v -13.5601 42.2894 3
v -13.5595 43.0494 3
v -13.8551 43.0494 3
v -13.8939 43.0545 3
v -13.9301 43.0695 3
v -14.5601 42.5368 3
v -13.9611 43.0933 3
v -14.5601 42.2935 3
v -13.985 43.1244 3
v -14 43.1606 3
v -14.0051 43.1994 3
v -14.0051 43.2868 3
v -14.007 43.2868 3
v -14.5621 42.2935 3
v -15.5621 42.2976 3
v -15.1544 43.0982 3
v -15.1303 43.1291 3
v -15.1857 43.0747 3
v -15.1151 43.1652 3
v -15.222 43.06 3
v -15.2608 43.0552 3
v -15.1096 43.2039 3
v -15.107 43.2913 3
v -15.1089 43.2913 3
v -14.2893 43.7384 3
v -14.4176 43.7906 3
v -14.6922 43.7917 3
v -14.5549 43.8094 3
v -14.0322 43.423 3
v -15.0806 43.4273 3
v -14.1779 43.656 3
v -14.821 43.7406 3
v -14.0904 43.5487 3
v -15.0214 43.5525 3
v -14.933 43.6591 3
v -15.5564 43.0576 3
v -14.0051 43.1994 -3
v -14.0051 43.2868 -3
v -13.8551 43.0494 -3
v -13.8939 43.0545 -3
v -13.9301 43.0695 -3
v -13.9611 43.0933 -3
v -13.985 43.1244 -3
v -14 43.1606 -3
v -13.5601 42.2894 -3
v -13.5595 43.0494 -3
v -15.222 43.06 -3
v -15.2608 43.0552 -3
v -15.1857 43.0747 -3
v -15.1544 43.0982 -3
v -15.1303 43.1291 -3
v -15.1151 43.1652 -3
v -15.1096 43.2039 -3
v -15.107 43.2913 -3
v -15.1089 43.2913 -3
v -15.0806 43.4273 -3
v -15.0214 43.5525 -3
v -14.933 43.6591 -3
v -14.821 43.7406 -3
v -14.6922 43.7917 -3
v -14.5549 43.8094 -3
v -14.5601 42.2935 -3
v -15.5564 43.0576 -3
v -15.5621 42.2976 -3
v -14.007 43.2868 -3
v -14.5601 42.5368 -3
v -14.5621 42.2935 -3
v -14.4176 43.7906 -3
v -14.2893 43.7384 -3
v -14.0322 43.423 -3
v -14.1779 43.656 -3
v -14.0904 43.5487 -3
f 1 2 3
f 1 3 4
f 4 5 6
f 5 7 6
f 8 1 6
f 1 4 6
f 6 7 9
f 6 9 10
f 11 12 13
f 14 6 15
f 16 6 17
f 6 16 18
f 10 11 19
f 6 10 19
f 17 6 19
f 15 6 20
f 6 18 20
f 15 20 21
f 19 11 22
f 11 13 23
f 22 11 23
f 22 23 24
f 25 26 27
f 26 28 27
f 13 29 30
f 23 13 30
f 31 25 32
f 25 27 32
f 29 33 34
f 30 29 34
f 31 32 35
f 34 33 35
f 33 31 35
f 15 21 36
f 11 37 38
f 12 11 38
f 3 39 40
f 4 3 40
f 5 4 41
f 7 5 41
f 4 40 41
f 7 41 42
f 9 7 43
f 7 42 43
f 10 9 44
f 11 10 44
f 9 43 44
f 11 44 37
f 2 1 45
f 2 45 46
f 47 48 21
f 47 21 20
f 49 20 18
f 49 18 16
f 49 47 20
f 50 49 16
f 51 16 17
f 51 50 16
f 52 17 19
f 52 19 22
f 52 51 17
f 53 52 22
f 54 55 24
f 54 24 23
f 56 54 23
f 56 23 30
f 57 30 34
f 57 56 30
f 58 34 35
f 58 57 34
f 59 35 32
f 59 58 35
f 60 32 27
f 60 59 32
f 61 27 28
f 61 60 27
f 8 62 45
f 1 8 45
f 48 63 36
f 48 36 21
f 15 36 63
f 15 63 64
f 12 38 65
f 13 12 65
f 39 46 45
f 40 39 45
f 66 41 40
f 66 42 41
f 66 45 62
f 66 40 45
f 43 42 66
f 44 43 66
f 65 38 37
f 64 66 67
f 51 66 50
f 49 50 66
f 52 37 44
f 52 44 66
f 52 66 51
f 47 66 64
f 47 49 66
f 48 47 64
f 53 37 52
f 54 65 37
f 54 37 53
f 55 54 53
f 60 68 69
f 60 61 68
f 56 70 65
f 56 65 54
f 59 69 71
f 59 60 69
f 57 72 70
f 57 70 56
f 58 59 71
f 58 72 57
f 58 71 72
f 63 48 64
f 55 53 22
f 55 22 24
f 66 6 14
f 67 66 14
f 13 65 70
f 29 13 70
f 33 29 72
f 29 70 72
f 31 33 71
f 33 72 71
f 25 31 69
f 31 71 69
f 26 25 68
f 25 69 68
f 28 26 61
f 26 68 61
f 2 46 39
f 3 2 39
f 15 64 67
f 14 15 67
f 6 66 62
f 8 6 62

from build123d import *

# Parameters (mm, degrees)
BOSS_EXTRUDE1_START     = -3
BOSS_EXTRUDE1_DEPTH     = 6
CUT_EXTRUDE1_DEPTH      = 48.233441213
CUT_EXTRUDE1_DEPTH_BACK = 48.233441213


# Read off the part's stored shape, not the designer's step: Boss-Extrude1
with BuildPart() as part:
    # Boss-Extrude1 outline → Boss-Extrude1 (new body)
    with BuildSketch(Plane.XY.offset(BOSS_EXTRUDE1_START)):
        with BuildLine():
            ThreePointArc((-14.00696142, 43.286772628), (-14.17794226, 43.656035086), (-14.554858855, 43.809407478))
            Line((-14.554858855, 43.809407478), (-14.560076412, 42.536772628))
            Line((-14.560076412, 42.536772628), (-14.560076412, 42.289407478))
            Line((-14.560076412, 42.289407478), (-12.560077389, 42.289407478))
            Line((-12.560077389, 42.289407478), (-12.560077389, 42.699408687))
            Line((-12.560077389, 42.699408687), (-12.561019893, 42.699407886))
            Line((-12.561019893, 42.699407886), (-12.561019893, 43.809407886))
            ThreePointArc((-12.561019893, 43.809407886), (-12.952915394, 43.647400147), (-13.116017726, 43.255958938))
            Line((-13.116017726, 43.255958938), (-13.116017726, 43.253512386))
            ThreePointArc((-13.116017726, 43.253512386), (-13.115577754, 43.232295081), (-13.11432695, 43.211110107))
            ThreePointArc((-13.11432695, 43.211110107), (-13.153744256, 43.09756294), (-13.263870251, 43.049407478))
            Line((-13.263870251, 43.049407478), (-13.855076412, 43.049407478))
            ThreePointArc((-13.855076412, 43.049407478), (-13.961142429, 43.093341461), (-14.005076412, 43.199407478))
            Line((-14.005076412, 43.199407478), (-14.005076412, 43.286772628))
            Line((-14.005076412, 43.286772628), (-14.00696142, 43.286772628))
        make_face()
    boss_extrude1 = extrude(amount=BOSS_EXTRUDE1_DEPTH)

    # Mirror1: Boss-Extrude1 across plane
    add(boss_extrude1.mirror(Plane(origin=(-14.554858855, 43.809407478, 3), x_dir=(0, 0, 1), z_dir=(0.999991595899715, -0.004099771937727064, 0))))

    # Sketch2 → Cut-Extrude1 (cut, two sides: drawn at the far end of the back side and taken through both)
    with BuildSketch(Plane.XY.offset(3).offset(-CUT_EXTRUDE1_DEPTH_BACK)):
        Polygon((-15.556442519, 43.057594665), (-15.562070571, 42.297615265), (-13.560076901, 42.289407478), (-13.559473332, 43.049407478), (-13.559473332, 43.956069089), (-12.181780454, 43.956069089), (-12.181780454, 41.780834702), (-16.94397701, 41.941153484), (-16.798232662, 44.196547263), (-15.556442519, 43.988861567), align=None)
    extrude(amount=CUT_EXTRUDE1_DEPTH + CUT_EXTRUDE1_DEPTH_BACK, mode=Mode.SUBTRACT)


solid = part.part
